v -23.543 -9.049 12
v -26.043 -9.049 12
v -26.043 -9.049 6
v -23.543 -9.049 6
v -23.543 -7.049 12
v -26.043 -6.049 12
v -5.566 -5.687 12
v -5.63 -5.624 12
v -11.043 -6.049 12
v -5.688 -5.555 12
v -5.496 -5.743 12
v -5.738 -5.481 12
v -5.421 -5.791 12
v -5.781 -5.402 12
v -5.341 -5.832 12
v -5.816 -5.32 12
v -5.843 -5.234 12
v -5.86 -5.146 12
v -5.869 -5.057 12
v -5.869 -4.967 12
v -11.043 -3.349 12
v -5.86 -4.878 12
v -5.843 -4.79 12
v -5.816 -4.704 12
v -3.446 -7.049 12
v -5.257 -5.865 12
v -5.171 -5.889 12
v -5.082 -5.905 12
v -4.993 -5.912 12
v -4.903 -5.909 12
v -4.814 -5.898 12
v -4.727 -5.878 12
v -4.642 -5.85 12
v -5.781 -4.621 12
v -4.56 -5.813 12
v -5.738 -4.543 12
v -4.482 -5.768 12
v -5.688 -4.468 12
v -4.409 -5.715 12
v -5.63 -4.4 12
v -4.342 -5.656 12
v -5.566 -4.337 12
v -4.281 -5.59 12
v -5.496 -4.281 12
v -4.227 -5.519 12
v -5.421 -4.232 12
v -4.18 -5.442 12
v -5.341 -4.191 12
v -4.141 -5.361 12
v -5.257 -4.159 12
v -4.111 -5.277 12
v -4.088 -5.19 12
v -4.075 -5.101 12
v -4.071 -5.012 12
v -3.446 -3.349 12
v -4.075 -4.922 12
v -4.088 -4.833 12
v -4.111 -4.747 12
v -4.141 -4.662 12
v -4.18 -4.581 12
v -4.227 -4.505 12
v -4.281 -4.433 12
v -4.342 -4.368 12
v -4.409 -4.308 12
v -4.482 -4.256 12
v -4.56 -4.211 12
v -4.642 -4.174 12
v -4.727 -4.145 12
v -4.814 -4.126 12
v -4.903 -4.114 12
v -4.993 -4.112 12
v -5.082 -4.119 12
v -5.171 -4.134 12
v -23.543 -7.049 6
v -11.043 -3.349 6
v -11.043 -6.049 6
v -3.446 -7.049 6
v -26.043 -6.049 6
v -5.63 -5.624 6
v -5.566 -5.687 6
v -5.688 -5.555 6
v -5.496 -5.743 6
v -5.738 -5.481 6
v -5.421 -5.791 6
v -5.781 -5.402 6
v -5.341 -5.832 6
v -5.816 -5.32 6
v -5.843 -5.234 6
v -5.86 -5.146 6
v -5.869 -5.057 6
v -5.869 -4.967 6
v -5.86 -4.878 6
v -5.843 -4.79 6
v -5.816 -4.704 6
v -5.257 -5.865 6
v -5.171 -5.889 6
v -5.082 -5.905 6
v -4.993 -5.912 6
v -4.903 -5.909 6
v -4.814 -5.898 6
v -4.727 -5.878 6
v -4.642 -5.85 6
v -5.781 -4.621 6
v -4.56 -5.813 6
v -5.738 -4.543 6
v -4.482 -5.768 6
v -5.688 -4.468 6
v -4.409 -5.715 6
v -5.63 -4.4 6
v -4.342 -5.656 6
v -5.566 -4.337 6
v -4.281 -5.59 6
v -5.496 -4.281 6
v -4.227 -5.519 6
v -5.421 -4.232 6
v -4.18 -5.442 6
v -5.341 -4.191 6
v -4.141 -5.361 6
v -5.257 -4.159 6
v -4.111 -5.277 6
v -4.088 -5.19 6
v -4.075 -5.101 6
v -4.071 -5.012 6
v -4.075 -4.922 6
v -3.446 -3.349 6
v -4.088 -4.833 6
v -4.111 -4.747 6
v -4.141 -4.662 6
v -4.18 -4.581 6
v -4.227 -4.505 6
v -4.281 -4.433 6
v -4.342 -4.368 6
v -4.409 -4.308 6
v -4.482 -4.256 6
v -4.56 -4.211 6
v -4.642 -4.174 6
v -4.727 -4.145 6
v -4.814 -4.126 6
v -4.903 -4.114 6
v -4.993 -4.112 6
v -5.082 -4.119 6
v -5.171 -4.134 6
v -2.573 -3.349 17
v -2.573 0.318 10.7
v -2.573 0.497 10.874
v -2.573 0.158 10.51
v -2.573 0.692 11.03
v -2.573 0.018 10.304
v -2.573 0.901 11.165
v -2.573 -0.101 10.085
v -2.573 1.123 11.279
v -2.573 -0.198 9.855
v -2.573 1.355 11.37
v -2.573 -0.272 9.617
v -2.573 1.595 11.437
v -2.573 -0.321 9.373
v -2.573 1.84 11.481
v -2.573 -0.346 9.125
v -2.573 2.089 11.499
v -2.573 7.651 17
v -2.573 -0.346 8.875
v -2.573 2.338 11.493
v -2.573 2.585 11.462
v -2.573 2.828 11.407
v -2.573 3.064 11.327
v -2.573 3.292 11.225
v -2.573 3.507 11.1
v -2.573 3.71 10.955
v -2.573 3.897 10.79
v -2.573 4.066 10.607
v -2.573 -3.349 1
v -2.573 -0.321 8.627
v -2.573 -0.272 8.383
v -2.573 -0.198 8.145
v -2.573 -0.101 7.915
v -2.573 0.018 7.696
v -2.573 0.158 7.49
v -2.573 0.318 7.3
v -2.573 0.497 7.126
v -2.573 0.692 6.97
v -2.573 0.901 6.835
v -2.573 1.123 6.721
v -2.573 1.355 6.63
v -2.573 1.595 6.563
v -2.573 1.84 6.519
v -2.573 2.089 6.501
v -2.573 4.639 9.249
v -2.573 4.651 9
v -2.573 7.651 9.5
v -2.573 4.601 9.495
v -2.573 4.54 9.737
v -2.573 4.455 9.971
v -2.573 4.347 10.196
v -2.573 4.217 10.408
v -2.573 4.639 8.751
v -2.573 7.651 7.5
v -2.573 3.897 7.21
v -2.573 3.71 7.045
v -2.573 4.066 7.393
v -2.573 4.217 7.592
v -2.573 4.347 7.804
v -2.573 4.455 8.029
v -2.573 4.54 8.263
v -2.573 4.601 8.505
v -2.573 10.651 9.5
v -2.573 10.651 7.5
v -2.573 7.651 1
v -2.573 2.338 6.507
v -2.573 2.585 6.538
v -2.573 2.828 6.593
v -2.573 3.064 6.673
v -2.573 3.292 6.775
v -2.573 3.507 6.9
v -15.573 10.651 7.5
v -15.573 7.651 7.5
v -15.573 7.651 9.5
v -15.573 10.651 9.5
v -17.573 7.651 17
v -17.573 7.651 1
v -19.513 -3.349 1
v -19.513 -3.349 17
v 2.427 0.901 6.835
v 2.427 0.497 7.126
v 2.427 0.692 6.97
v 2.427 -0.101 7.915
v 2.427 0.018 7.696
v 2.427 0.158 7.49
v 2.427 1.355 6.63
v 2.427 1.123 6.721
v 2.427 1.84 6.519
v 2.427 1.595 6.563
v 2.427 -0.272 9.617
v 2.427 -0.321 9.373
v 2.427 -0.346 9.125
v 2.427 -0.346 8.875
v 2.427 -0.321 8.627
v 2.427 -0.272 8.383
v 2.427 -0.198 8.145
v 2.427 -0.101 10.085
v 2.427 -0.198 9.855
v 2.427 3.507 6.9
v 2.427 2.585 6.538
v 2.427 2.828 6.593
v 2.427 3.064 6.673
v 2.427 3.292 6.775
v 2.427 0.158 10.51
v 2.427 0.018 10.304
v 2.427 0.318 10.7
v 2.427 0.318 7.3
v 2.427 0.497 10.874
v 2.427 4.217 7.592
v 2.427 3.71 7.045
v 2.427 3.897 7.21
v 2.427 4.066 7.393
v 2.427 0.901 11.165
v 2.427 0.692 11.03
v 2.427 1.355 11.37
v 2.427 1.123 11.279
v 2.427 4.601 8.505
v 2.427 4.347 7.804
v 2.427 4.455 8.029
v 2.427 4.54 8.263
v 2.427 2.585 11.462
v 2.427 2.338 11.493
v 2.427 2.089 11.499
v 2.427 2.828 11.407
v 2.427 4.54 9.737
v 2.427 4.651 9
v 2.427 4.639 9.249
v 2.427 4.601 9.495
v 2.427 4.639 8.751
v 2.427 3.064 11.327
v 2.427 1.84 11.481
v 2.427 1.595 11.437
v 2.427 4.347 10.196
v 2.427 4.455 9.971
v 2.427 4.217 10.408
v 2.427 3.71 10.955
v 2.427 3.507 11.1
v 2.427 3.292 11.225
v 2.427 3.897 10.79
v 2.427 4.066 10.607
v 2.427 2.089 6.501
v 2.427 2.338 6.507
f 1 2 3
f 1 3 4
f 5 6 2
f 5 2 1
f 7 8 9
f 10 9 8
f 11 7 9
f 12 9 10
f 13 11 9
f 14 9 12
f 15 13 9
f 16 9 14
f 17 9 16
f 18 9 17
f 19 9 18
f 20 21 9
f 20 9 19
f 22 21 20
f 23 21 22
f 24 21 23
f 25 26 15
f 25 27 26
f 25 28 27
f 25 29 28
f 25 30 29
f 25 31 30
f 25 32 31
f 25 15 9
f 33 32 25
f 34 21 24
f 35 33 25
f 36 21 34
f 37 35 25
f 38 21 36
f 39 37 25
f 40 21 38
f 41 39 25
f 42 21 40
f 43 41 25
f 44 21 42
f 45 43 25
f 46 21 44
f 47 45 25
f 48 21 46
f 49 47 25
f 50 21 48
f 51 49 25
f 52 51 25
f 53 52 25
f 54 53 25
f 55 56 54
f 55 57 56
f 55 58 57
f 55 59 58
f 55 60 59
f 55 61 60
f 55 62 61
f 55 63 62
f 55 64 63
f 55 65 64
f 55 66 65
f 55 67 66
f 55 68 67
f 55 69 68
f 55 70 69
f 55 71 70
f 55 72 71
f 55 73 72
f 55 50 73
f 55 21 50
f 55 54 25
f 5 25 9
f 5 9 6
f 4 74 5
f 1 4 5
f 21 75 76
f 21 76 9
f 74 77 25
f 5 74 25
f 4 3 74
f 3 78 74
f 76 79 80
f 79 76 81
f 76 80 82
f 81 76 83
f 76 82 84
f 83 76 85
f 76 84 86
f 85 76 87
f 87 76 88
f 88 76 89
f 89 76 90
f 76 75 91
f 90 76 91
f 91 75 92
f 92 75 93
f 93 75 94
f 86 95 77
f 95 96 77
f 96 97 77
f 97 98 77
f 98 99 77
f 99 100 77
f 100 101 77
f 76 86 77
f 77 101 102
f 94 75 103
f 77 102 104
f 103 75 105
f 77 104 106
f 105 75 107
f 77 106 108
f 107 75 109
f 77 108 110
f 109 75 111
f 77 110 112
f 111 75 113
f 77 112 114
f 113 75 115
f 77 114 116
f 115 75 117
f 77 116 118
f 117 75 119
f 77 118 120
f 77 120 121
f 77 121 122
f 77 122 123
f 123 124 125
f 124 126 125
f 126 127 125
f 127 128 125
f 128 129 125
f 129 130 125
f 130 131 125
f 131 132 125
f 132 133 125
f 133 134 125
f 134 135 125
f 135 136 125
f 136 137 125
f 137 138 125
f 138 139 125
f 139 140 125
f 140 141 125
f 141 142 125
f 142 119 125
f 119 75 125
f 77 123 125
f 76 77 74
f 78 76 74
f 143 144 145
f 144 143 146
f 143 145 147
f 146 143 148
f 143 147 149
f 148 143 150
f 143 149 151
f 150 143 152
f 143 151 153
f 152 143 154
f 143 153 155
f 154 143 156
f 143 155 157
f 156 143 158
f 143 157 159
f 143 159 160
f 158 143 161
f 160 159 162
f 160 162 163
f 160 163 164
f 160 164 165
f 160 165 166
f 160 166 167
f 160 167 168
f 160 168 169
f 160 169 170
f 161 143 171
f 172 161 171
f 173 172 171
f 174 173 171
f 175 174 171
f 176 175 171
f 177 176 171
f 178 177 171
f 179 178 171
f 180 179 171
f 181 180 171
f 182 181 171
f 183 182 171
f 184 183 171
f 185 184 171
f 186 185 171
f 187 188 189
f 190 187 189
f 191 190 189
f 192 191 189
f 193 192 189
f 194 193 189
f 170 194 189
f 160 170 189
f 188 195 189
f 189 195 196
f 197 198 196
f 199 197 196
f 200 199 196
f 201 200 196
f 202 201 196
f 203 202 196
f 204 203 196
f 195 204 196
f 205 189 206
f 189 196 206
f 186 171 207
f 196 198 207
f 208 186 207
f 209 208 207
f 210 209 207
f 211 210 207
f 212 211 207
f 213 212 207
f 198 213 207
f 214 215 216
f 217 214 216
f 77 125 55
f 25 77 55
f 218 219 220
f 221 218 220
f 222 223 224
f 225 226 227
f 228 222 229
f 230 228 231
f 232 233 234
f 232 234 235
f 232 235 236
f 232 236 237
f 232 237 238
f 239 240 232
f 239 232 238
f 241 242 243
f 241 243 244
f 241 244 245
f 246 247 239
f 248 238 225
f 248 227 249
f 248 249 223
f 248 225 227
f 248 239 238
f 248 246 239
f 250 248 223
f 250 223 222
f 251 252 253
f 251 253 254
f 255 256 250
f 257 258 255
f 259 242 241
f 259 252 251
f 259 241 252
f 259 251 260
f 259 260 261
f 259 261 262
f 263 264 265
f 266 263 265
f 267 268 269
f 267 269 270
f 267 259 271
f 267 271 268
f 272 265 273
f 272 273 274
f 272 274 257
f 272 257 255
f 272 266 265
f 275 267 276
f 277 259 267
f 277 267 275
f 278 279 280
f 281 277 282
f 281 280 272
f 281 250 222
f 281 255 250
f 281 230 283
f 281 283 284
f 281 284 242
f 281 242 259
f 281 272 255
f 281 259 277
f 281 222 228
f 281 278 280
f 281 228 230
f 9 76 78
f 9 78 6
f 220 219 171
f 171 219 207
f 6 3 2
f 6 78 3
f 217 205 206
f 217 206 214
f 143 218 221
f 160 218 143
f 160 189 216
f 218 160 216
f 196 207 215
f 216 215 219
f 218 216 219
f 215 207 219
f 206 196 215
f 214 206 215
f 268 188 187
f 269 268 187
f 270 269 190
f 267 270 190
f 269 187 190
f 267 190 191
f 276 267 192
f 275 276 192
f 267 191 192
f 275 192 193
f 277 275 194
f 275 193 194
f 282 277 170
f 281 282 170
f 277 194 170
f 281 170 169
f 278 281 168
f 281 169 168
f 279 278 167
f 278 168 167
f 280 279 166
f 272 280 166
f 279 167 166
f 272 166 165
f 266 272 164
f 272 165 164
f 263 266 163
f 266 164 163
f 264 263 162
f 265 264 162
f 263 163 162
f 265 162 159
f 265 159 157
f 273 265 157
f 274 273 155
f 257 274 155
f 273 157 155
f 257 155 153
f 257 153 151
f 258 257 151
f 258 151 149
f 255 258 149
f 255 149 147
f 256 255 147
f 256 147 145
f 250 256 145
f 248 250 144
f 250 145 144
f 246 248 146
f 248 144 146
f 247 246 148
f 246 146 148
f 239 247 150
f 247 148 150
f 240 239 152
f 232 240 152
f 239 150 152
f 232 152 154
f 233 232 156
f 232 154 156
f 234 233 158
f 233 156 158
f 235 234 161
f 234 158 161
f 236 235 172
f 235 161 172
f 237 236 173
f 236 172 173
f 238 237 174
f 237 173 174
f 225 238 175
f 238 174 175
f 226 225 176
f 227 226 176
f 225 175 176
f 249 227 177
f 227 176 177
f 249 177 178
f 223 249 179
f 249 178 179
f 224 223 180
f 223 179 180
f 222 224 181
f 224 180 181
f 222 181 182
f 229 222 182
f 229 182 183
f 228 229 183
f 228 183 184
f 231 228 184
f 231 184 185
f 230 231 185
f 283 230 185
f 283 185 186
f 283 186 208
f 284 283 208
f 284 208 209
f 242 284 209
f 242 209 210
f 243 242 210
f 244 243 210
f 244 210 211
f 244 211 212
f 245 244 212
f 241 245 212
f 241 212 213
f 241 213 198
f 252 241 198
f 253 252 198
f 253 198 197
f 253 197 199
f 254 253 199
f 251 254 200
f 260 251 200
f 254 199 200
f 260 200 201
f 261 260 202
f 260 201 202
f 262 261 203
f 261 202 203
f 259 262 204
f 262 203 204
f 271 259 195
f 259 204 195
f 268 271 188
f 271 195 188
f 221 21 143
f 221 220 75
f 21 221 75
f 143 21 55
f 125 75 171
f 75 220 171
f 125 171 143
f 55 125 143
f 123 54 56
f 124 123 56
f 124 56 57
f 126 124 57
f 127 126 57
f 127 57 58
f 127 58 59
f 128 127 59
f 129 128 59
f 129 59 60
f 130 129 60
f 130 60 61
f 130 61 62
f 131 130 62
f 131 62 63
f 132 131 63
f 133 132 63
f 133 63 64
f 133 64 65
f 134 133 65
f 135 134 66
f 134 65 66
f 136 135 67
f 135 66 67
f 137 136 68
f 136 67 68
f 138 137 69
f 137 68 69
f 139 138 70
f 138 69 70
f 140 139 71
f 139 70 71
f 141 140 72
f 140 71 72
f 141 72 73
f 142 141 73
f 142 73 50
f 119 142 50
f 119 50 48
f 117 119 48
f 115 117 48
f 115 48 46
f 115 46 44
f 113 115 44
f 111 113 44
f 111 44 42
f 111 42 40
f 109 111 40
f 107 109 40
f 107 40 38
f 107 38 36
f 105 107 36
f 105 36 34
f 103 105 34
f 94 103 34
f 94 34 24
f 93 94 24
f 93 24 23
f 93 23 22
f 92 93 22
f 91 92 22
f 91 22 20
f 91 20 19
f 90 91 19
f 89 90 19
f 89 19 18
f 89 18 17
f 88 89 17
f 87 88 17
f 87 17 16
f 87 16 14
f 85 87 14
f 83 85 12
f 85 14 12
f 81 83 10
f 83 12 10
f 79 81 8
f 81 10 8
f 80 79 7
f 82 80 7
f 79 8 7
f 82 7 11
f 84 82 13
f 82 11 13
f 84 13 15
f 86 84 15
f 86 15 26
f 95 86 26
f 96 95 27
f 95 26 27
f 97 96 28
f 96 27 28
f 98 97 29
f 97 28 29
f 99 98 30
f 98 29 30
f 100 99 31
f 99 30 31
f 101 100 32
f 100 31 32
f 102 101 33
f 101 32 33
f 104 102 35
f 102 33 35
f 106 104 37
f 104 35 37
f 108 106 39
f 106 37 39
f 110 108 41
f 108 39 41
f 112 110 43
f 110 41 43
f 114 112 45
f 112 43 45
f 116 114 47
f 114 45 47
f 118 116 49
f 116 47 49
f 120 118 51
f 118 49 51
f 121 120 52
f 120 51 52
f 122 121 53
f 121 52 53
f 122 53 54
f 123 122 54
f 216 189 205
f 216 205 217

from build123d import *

# Parameters (mm, degrees)
F1_DEPTH  = 18
F2_R      = 2.5
F3_DEPTH  = 5
F4_W      = 13
F4_H      = 2
F5_DEPTH  = 3
F6_W      = 7.5974241367
F6_H      = 6
F7_DEPTH  = 3.7
F8_R      = 0.9
F9_DEPTH  = 10
F10_W     = 1
F10_H     = 6
F11_DEPTH = 15
F12_W     = 2.5
F12_H     = 6
F13_DEPTH = 2
F14_DEPTH = 1
F15_DEPTH = 1


with BuildPart() as f1:
    # F0 (on Top) → F1 (new body)
    with BuildSketch(Plane.XY):
        Polygon((-2.5732557046, 7.6509772142), (-17.5732557046, 7.6509772142), (-19.5128524924, -3.3490227858), (-2.5732557046, -3.3490227858), align=None)
    extrude(amount=F1_DEPTH)

    # F2 (on face) → F3 (join)
    with BuildSketch(Plane.YZ.offset(-2.5732557046)):
        with Locations((2.1509772142, 9)):
            Circle(F2_R)
    extrude(amount=F3_DEPTH)

    # F4 (on face) → F5 (join)
    with BuildSketch(Plane(origin=(0, 7.6509772142, 0), x_dir=(-1, 0, 0), z_dir=(0, 1, 0))):
        with Locations((9.0732557046, 8.5)):
            Rectangle(F4_W, F4_H)
    extrude(amount=F5_DEPTH)

    # F6 (on face) → F7 (join)
    with BuildSketch(Plane.XZ.offset(3.3490227858)):
        with Locations((-7.2443420301, 9)):
            Rectangle(F6_W, F6_H)
    extrude(amount=F7_DEPTH)

    # F8 (on face) → F9 (cut)
    with BuildSketch(Plane.XY.offset(12)):
        with Locations((-4.9705179408, -5.0118290819)):
            Circle(F8_R)
    extrude(amount=-F9_DEPTH, mode=Mode.SUBTRACT)

    # F10 (on face) → F11 (join)
    with BuildSketch(Plane(origin=(-11.0430540985, 0, 0), x_dir=(0, -1, 0), z_dir=(-1, 0, 0))):
        with Locations((6.5490227858, 9)):
            Rectangle(F10_W, F10_H)
    extrude(amount=F11_DEPTH)

    # F12 (on face) → F13 (join)
    with BuildSketch(Plane.XZ.offset(7.0490227858)):
        with Locations((-24.7930540985, 9)):
            Rectangle(F12_W, F12_H)
    extrude(amount=F13_DEPTH)

    # F14 (cut): a face of the model
    f14_faces = [f1.faces().sort_by_distance(p)[0] for p in [
        (-10.5679703972, 2.0396443295, 0),
    ]]
    extrude(f14_faces, amount=-F14_DEPTH, mode=Mode.SUBTRACT)

    # F15 (cut): a face of the model
    f15_faces = [f1.faces().sort_by_distance(p)[0] for p in [
        (-10.5679703972, 2.0396443295, 18),
    ]]
    extrude(f15_faces, amount=-F15_DEPTH, mode=Mode.SUBTRACT)


solid = f1.part
